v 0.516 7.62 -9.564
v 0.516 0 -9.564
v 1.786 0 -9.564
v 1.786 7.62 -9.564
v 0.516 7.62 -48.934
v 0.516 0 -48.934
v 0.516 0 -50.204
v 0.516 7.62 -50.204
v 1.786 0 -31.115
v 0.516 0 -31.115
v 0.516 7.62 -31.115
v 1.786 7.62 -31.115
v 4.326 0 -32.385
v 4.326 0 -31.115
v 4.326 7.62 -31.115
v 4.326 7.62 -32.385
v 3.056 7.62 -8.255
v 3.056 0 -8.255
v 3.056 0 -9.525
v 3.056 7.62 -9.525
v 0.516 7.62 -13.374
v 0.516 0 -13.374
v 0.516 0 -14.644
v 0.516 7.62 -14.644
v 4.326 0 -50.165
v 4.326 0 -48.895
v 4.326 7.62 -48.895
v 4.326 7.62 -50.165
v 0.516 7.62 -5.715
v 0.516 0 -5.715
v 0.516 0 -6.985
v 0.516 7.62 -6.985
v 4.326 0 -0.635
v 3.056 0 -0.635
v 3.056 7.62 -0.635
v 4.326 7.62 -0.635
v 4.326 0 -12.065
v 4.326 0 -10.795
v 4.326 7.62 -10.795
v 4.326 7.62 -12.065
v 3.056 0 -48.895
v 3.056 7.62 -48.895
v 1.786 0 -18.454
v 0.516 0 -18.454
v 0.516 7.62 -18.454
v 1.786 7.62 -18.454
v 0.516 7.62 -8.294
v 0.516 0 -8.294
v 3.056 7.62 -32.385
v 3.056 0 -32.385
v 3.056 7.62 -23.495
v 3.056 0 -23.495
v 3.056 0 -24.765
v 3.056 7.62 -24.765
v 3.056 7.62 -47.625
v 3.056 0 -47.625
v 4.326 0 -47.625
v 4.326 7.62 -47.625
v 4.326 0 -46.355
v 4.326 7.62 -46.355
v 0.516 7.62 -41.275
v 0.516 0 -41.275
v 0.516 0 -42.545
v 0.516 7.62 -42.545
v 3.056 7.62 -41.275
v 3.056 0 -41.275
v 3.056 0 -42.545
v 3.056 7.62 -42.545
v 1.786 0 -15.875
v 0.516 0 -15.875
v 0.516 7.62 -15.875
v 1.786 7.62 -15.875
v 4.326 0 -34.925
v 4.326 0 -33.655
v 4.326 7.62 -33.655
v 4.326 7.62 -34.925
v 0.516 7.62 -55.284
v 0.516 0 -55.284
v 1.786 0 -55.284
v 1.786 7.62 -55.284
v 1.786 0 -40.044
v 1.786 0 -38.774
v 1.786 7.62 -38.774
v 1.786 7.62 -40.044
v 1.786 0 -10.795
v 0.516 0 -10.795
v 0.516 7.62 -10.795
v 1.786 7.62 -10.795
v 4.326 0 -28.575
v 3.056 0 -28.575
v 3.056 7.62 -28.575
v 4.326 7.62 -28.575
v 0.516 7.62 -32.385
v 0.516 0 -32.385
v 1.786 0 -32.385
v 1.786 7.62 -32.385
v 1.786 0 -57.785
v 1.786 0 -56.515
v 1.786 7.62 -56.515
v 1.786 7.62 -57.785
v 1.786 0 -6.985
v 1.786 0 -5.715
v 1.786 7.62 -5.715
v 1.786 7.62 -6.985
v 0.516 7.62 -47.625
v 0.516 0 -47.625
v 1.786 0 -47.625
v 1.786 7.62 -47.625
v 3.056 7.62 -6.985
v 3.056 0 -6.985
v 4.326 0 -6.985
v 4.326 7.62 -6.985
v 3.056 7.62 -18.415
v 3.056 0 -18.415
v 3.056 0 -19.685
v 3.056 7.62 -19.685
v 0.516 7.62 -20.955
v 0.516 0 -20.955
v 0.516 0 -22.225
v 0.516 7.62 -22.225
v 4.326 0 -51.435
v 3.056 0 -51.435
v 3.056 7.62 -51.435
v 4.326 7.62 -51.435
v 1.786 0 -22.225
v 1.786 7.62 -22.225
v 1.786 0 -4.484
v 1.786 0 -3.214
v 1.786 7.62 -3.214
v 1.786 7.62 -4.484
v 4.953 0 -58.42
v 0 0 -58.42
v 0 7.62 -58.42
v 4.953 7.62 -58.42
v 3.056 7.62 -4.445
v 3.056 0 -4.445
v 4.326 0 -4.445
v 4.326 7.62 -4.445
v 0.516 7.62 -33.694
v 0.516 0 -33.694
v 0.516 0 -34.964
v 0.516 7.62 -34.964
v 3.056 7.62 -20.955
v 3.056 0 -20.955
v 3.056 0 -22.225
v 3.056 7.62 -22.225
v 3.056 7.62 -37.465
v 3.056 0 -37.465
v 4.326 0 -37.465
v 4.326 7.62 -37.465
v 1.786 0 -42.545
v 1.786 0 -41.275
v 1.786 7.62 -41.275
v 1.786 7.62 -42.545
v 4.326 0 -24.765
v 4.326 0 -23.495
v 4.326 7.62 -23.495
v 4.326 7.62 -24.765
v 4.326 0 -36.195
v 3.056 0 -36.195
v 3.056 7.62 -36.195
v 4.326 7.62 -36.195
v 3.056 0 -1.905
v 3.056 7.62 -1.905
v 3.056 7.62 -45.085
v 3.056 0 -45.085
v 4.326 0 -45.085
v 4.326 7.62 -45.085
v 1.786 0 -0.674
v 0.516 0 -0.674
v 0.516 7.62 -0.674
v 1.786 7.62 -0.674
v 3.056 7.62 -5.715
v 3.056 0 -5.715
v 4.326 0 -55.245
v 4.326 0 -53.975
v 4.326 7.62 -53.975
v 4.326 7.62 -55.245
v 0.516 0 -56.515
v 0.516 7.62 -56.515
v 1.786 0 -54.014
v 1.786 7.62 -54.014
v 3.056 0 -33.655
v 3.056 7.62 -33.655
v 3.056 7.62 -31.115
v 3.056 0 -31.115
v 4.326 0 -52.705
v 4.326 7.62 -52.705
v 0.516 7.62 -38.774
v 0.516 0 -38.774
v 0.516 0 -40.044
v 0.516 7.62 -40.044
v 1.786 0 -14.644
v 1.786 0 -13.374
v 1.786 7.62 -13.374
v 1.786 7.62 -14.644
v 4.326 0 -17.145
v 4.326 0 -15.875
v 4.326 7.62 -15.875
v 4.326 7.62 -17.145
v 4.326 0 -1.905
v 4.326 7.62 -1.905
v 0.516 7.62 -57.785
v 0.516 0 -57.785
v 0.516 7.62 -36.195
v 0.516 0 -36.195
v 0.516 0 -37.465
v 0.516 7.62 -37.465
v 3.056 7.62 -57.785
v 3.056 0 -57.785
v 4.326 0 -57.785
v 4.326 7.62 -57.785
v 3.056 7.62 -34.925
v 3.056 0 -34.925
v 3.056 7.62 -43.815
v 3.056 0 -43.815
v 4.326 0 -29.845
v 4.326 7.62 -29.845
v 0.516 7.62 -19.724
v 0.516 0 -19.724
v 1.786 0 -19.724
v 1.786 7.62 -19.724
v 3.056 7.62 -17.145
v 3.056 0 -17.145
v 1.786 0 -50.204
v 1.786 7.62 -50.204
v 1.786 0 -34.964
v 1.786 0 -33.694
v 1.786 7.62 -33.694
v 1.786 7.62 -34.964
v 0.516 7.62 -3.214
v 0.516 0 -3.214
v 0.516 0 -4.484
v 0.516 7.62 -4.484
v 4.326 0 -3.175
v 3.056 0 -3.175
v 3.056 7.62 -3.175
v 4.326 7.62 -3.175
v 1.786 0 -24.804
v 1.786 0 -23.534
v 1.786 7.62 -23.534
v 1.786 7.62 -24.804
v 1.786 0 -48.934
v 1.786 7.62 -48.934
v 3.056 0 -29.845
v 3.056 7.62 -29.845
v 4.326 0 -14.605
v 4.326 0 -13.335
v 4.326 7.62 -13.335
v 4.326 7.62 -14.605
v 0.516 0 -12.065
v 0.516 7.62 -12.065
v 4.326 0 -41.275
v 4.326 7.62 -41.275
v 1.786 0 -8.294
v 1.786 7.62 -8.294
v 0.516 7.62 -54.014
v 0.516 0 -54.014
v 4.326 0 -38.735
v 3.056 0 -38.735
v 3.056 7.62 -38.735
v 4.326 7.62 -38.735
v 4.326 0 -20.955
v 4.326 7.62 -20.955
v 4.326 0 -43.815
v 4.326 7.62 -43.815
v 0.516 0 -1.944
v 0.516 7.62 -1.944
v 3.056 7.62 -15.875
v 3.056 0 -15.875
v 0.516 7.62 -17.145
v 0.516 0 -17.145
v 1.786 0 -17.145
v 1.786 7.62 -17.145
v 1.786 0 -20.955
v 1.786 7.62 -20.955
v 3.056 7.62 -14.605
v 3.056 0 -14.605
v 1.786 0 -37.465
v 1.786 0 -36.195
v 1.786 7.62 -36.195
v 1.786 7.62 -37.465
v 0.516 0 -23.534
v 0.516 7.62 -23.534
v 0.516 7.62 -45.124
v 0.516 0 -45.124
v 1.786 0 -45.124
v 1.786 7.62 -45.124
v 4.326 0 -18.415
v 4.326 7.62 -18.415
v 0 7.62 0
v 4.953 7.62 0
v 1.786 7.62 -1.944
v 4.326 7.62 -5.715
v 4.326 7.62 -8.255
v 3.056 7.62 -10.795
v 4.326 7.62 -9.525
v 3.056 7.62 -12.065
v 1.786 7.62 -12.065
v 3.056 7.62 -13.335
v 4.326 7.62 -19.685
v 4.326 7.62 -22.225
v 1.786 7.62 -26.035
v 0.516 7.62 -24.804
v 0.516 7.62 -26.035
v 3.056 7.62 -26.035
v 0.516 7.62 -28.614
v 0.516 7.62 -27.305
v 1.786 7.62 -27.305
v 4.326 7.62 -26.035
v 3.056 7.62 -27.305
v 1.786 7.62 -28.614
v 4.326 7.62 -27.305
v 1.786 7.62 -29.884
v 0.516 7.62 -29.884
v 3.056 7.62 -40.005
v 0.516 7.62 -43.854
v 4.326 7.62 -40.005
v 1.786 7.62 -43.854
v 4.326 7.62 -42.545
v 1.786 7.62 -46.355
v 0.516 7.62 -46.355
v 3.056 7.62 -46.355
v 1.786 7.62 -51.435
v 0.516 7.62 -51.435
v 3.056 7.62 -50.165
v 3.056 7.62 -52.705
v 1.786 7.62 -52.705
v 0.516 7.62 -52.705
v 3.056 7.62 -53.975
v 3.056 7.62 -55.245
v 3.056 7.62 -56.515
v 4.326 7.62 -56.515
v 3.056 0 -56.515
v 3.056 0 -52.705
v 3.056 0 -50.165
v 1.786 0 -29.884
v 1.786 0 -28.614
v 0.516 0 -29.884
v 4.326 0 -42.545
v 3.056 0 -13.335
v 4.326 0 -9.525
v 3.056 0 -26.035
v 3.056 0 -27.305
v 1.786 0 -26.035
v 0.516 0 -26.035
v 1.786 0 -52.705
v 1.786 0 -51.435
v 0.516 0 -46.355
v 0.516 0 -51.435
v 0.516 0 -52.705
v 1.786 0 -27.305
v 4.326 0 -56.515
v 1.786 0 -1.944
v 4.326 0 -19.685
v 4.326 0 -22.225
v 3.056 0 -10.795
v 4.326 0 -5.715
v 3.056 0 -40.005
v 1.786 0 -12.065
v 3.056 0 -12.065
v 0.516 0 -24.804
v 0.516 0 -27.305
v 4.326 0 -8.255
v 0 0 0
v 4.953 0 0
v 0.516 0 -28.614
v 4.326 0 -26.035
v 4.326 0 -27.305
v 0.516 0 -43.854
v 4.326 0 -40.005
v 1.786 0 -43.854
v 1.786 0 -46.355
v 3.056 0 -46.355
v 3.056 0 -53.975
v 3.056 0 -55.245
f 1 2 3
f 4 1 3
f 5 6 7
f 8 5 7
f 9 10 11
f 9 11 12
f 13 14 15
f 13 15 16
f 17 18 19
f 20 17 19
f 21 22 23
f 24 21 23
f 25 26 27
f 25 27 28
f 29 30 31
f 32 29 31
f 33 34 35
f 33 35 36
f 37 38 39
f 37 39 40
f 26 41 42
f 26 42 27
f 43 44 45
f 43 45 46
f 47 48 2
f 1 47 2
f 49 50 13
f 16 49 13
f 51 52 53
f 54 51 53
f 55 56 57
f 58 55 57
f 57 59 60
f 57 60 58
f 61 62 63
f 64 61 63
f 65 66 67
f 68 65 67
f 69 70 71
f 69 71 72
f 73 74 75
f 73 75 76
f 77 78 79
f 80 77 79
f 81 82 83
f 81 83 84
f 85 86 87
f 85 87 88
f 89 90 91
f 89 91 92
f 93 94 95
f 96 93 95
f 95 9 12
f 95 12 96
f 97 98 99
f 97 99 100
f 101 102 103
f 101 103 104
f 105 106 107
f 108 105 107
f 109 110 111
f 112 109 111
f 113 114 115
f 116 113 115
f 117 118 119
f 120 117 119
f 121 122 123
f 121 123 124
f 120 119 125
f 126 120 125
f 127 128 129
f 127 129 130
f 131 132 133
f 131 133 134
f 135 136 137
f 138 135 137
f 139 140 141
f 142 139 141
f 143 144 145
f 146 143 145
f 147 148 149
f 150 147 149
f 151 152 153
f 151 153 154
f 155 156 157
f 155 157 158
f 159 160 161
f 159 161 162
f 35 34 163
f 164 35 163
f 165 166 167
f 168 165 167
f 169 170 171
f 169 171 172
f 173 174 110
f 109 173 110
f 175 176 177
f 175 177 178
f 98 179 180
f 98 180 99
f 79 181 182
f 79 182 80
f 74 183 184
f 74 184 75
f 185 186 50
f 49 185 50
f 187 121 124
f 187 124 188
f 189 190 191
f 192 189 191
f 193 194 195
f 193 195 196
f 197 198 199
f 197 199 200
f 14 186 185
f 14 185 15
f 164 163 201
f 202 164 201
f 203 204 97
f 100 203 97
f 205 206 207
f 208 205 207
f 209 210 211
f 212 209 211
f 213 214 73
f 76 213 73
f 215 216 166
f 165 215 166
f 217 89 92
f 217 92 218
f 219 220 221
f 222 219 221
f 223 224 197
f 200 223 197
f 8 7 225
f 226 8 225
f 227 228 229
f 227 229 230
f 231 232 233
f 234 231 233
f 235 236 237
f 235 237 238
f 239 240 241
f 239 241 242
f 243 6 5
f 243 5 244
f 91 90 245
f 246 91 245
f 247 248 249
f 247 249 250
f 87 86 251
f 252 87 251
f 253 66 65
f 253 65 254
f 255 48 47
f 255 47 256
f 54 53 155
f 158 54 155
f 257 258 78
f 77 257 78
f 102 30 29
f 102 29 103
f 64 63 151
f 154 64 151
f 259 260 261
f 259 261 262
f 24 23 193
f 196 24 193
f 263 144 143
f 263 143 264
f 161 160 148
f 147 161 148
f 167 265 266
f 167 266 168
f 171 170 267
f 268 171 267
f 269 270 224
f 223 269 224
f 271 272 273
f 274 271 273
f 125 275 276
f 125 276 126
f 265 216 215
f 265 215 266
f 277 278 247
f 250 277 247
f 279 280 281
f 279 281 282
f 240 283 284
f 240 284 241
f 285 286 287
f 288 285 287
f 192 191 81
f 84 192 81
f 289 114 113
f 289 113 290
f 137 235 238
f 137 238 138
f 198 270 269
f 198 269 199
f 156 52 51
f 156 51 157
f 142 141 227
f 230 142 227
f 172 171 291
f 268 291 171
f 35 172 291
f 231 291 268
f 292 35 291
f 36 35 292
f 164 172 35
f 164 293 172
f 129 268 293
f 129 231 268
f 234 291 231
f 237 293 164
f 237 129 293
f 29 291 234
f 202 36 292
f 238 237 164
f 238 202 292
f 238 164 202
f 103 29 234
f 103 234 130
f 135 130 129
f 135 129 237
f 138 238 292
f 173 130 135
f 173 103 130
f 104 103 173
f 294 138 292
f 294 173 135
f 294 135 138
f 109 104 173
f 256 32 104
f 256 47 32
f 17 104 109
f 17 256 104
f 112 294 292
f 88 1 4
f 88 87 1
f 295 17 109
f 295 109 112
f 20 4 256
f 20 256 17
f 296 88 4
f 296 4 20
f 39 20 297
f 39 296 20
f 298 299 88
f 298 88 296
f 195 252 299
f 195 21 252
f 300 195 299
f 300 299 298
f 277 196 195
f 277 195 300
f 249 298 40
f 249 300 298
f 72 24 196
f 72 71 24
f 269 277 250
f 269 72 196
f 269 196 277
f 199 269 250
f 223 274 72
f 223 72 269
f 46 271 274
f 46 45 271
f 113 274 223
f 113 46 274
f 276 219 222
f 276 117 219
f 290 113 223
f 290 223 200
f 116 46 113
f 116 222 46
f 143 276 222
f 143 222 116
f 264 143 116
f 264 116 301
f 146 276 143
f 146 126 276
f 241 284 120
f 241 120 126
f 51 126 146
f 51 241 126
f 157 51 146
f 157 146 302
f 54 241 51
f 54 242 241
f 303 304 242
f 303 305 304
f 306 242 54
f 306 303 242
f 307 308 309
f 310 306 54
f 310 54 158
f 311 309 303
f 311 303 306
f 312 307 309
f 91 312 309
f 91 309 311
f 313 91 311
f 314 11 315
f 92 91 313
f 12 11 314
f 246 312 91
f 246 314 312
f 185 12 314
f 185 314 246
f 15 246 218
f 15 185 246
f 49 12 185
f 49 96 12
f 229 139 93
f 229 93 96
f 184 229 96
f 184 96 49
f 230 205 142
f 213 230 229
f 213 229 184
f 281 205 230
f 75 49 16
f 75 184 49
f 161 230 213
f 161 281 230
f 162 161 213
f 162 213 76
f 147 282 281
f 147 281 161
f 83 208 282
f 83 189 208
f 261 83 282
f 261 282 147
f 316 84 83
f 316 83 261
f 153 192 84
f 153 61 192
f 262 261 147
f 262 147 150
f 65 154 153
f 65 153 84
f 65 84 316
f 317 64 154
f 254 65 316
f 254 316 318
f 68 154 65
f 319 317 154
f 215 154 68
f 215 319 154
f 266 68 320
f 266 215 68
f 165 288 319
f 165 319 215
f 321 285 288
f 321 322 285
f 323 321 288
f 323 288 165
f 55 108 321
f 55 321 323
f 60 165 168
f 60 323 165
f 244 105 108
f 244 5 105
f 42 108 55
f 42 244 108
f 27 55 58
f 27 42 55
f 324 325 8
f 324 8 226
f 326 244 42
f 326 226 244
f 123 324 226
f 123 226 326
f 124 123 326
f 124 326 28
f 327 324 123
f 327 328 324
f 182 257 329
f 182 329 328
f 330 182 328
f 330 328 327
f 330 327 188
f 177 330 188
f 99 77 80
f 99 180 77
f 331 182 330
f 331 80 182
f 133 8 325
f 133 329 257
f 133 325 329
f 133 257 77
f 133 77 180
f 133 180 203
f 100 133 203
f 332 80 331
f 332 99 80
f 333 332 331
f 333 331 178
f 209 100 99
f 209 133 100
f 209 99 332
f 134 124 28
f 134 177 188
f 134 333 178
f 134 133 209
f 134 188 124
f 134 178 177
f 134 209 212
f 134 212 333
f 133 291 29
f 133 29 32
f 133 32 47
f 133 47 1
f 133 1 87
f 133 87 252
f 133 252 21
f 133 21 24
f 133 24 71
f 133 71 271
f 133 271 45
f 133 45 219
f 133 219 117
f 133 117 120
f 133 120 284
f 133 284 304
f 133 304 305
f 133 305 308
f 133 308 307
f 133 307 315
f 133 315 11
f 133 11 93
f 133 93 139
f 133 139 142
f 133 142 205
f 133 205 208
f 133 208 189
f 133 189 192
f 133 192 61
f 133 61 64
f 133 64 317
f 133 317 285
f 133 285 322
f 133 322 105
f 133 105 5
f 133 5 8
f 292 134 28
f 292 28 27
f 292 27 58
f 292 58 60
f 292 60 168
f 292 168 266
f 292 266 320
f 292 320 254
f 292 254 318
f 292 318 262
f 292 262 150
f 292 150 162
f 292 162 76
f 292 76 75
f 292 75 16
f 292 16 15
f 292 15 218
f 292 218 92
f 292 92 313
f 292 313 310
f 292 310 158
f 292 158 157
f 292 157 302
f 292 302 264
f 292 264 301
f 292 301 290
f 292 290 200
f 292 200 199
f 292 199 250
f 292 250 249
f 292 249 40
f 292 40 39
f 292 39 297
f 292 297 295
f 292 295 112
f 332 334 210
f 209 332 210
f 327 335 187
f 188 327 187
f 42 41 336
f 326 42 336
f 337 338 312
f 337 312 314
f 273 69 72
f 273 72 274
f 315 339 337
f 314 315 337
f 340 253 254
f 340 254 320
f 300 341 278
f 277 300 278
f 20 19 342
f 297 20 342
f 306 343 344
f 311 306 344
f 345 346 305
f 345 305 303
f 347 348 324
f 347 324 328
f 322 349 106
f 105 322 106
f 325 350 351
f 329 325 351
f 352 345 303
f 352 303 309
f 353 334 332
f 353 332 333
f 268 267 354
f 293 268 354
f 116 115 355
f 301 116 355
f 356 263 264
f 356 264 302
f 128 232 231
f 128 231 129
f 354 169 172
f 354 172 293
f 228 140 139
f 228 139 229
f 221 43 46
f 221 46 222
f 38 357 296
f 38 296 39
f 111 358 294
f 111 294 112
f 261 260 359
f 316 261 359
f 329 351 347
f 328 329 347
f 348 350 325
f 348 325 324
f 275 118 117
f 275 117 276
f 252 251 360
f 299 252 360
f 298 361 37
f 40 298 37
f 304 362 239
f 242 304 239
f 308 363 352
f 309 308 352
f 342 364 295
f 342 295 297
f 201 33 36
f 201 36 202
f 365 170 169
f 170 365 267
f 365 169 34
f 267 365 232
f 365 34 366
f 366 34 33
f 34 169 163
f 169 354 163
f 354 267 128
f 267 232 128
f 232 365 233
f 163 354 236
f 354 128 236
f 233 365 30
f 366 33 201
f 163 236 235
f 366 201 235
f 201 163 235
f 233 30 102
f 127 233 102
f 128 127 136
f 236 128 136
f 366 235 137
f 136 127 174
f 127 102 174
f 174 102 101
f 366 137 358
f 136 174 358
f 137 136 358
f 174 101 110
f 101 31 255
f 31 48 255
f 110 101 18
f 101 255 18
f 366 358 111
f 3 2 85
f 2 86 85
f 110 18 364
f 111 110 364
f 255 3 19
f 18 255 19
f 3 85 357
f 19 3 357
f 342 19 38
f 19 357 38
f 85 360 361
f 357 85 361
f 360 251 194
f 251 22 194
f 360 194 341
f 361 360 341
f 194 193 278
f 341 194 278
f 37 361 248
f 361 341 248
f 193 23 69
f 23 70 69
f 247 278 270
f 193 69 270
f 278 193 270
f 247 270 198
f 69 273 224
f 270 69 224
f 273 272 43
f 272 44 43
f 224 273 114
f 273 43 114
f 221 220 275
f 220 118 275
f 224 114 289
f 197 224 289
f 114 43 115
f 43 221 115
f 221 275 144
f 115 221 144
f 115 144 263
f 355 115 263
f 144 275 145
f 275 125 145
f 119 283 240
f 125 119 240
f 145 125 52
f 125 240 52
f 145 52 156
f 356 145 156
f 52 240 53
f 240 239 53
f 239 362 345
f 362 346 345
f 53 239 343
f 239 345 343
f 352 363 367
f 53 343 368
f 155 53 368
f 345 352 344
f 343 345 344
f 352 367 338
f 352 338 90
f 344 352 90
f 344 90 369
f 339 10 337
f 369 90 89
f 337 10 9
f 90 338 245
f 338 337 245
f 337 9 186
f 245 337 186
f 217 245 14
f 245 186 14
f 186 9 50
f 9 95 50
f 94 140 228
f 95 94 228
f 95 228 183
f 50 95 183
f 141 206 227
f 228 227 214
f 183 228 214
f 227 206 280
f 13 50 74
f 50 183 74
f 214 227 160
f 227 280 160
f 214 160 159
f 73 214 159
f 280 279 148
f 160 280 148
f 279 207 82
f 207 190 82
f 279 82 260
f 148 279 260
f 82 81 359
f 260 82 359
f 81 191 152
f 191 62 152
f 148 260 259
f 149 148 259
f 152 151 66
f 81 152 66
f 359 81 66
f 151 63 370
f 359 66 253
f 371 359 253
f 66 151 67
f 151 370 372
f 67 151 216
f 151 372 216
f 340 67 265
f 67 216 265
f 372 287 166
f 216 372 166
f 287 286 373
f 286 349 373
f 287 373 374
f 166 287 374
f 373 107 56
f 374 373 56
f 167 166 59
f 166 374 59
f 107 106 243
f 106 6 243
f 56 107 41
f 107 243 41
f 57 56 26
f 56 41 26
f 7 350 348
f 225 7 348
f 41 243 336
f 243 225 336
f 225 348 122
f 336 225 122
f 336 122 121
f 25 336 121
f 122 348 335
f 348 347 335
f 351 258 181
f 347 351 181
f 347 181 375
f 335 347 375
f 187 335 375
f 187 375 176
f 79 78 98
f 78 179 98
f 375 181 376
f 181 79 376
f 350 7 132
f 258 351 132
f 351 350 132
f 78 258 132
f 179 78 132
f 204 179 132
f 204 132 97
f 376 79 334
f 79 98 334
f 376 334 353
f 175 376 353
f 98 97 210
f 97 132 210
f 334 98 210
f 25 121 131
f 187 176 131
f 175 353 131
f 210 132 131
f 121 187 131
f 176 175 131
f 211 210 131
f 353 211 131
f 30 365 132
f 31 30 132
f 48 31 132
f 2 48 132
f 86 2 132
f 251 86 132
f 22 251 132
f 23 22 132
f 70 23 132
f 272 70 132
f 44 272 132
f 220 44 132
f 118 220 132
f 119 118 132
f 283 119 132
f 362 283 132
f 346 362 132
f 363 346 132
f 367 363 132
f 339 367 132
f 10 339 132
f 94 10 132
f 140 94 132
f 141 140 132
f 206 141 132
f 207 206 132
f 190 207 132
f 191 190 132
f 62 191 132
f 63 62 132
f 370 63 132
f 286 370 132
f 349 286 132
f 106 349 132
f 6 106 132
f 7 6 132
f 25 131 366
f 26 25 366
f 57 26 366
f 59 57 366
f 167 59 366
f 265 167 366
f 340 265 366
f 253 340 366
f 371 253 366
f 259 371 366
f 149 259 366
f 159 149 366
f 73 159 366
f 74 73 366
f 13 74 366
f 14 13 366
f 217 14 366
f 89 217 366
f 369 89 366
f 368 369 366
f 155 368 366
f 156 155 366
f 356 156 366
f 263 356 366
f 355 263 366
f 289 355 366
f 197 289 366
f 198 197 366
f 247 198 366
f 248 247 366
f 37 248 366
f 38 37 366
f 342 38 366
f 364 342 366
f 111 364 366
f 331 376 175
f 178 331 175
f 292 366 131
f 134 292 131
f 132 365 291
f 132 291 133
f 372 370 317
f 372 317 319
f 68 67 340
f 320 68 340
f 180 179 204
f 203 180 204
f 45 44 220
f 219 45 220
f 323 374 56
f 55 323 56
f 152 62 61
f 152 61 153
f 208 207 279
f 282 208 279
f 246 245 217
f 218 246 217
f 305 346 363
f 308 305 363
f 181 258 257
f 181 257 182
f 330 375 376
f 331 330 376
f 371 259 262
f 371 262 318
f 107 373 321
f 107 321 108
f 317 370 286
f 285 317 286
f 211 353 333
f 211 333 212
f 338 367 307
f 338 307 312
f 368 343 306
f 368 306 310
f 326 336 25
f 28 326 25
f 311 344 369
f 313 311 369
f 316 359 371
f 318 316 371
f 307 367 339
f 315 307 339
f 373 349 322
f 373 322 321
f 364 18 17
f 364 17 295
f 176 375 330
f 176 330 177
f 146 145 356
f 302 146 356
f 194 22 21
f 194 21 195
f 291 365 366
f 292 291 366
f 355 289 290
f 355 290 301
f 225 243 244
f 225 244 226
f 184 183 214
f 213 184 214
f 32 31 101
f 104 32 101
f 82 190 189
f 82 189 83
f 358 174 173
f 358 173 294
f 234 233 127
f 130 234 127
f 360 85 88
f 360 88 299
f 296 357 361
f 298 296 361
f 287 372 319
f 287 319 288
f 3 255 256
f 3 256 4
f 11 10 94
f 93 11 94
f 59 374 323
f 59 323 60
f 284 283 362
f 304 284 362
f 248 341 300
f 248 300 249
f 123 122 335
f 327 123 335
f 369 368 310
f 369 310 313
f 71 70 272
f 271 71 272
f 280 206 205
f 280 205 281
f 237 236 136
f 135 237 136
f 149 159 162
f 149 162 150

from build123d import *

# Parameters (mm, degrees)
SKETCH1_W           = 4.953
SKETCH1_H           = 58.42
SKETCH1_W_2         = 1.27
SKETCH1_H_2         = 1.27
BOSS_EXTRUDE1_DEPTH = 7.62


with BuildPart() as part:
    # Sketch1 → Boss-Extrude1 (new body)
    with BuildSketch(Plane(origin=(0, 0, 0), x_dir=(1, 0, 0), z_dir=(0, 1, 0))):
        with Locations((2.4765, 29.21)):
            Rectangle(SKETCH1_W, SKETCH1_H)
        with Locations((3.691399704, 57.15)):
            Rectangle(SKETCH1_W_2, SKETCH1_H_2, mode=Mode.SUBTRACT)
        with Locations((1.151399704, 57.15)):
            Rectangle(SKETCH1_W_2, SKETCH1_H_2, mode=Mode.SUBTRACT)
        with Locations((3.691399704, 54.61)):
            Rectangle(SKETCH1_W_2, SKETCH1_H_2, mode=Mode.SUBTRACT)
        with Locations((1.151399704, 54.648853122)):
            Rectangle(SKETCH1_W_2, SKETCH1_H_2, mode=Mode.SUBTRACT)
        with Locations((3.691399704, 52.07)):
            Rectangle(SKETCH1_W_2, SKETCH1_H_2, mode=Mode.SUBTRACT)
        with Locations((1.151399704, 52.07)):
            Rectangle(SKETCH1_W_2, SKETCH1_H_2, mode=Mode.SUBTRACT)
        with Locations((3.691399704, 49.53)):
            Rectangle(SKETCH1_W_2, SKETCH1_H_2, mode=Mode.SUBTRACT)
        with Locations((1.151399704, 49.568853122)):
            Rectangle(SKETCH1_W_2, SKETCH1_H_2, mode=Mode.SUBTRACT)
        with Locations((3.691399704, 46.99)):
            Rectangle(SKETCH1_W_2, SKETCH1_H_2, mode=Mode.SUBTRACT)
        with Locations((1.151399704, 46.99)):
            Rectangle(SKETCH1_W_2, SKETCH1_H_2, mode=Mode.SUBTRACT)
        with Locations((3.691399704, 44.45)):
            Rectangle(SKETCH1_W_2, SKETCH1_H_2, mode=Mode.SUBTRACT)
        with Locations((1.151399704, 44.488853122)):
            Rectangle(SKETCH1_W_2, SKETCH1_H_2, mode=Mode.SUBTRACT)
        with Locations((3.691399704, 41.91)):
            Rectangle(SKETCH1_W_2, SKETCH1_H_2, mode=Mode.SUBTRACT)
        with Locations((1.151399704, 41.91)):
            Rectangle(SKETCH1_W_2, SKETCH1_H_2, mode=Mode.SUBTRACT)
        with Locations((3.691399704, 39.37)):
            Rectangle(SKETCH1_W_2, SKETCH1_H_2, mode=Mode.SUBTRACT)
        with Locations((1.151399704, 39.408853122)):
            Rectangle(SKETCH1_W_2, SKETCH1_H_2, mode=Mode.SUBTRACT)
        with Locations((3.691399704, 36.83)):
            Rectangle(SKETCH1_W_2, SKETCH1_H_2, mode=Mode.SUBTRACT)
        with Locations((1.151399704, 36.83)):
            Rectangle(SKETCH1_W_2, SKETCH1_H_2, mode=Mode.SUBTRACT)
        with Locations((3.691399704, 34.29)):
            Rectangle(SKETCH1_W_2, SKETCH1_H_2, mode=Mode.SUBTRACT)
        with Locations((1.151399704, 34.328853122)):
            Rectangle(SKETCH1_W_2, SKETCH1_H_2, mode=Mode.SUBTRACT)
        with Locations((3.691399704, 31.75)):
            Rectangle(SKETCH1_W_2, SKETCH1_H_2, mode=Mode.SUBTRACT)
        with Locations((1.151399704, 31.75)):
            Rectangle(SKETCH1_W_2, SKETCH1_H_2, mode=Mode.SUBTRACT)
        with Locations((3.691399704, 29.21)):
            Rectangle(SKETCH1_W_2, SKETCH1_H_2, mode=Mode.SUBTRACT)
        with Locations((1.151399704, 29.248853122)):
            Rectangle(SKETCH1_W_2, SKETCH1_H_2, mode=Mode.SUBTRACT)
        with Locations((3.691399704, 26.67)):
            Rectangle(SKETCH1_W_2, SKETCH1_H_2, mode=Mode.SUBTRACT)
        with Locations((1.151399704, 26.67)):
            Rectangle(SKETCH1_W_2, SKETCH1_H_2, mode=Mode.SUBTRACT)
        with Locations((3.691399704, 24.13)):
            Rectangle(SKETCH1_W_2, SKETCH1_H_2, mode=Mode.SUBTRACT)
        with Locations((1.151399704, 24.168853122)):
            Rectangle(SKETCH1_W_2, SKETCH1_H_2, mode=Mode.SUBTRACT)
        with Locations((3.691399704, 21.59)):
            Rectangle(SKETCH1_W_2, SKETCH1_H_2, mode=Mode.SUBTRACT)
        with Locations((1.151399704, 21.59)):
            Rectangle(SKETCH1_W_2, SKETCH1_H_2, mode=Mode.SUBTRACT)
        with Locations((3.691399704, 19.05)):
            Rectangle(SKETCH1_W_2, SKETCH1_H_2, mode=Mode.SUBTRACT)
        with Locations((1.151399704, 19.088853122)):
            Rectangle(SKETCH1_W_2, SKETCH1_H_2, mode=Mode.SUBTRACT)
        with Locations((3.691399704, 16.51)):
            Rectangle(SKETCH1_W_2, SKETCH1_H_2, mode=Mode.SUBTRACT)
        with Locations((1.151399704, 16.51)):
            Rectangle(SKETCH1_W_2, SKETCH1_H_2, mode=Mode.SUBTRACT)
        with Locations((3.691399704, 13.97)):
            Rectangle(SKETCH1_W_2, SKETCH1_H_2, mode=Mode.SUBTRACT)
        with Locations((1.151399704, 14.008853122)):
            Rectangle(SKETCH1_W_2, SKETCH1_H_2, mode=Mode.SUBTRACT)
        with Locations((3.691399704, 11.43)):
            Rectangle(SKETCH1_W_2, SKETCH1_H_2, mode=Mode.SUBTRACT)
        with Locations((1.151399704, 11.43)):
            Rectangle(SKETCH1_W_2, SKETCH1_H_2, mode=Mode.SUBTRACT)
        with Locations((3.691399704, 8.89)):
            Rectangle(SKETCH1_W_2, SKETCH1_H_2, mode=Mode.SUBTRACT)
        with Locations((1.151399704, 8.928853122)):
            Rectangle(SKETCH1_W_2, SKETCH1_H_2, mode=Mode.SUBTRACT)
        with Locations((3.691399704, 6.35)):
            Rectangle(SKETCH1_W_2, SKETCH1_H_2, mode=Mode.SUBTRACT)
        with Locations((1.151399704, 6.35)):
            Rectangle(SKETCH1_W_2, SKETCH1_H_2, mode=Mode.SUBTRACT)
        with Locations((3.691399704, 3.81)):
            Rectangle(SKETCH1_W_2, SKETCH1_H_2, mode=Mode.SUBTRACT)
        with Locations((1.151399704, 3.848853122)):
            Rectangle(SKETCH1_W_2, SKETCH1_H_2, mode=Mode.SUBTRACT)
        with Locations((3.691399704, 1.27)):
            Rectangle(SKETCH1_W_2, SKETCH1_H_2, mode=Mode.SUBTRACT)
        with Locations((1.151399704, 1.308853122)):
            Rectangle(SKETCH1_W_2, SKETCH1_H_2, mode=Mode.SUBTRACT)
    extrude(amount=BOSS_EXTRUDE1_DEPTH)


solid = part.part
